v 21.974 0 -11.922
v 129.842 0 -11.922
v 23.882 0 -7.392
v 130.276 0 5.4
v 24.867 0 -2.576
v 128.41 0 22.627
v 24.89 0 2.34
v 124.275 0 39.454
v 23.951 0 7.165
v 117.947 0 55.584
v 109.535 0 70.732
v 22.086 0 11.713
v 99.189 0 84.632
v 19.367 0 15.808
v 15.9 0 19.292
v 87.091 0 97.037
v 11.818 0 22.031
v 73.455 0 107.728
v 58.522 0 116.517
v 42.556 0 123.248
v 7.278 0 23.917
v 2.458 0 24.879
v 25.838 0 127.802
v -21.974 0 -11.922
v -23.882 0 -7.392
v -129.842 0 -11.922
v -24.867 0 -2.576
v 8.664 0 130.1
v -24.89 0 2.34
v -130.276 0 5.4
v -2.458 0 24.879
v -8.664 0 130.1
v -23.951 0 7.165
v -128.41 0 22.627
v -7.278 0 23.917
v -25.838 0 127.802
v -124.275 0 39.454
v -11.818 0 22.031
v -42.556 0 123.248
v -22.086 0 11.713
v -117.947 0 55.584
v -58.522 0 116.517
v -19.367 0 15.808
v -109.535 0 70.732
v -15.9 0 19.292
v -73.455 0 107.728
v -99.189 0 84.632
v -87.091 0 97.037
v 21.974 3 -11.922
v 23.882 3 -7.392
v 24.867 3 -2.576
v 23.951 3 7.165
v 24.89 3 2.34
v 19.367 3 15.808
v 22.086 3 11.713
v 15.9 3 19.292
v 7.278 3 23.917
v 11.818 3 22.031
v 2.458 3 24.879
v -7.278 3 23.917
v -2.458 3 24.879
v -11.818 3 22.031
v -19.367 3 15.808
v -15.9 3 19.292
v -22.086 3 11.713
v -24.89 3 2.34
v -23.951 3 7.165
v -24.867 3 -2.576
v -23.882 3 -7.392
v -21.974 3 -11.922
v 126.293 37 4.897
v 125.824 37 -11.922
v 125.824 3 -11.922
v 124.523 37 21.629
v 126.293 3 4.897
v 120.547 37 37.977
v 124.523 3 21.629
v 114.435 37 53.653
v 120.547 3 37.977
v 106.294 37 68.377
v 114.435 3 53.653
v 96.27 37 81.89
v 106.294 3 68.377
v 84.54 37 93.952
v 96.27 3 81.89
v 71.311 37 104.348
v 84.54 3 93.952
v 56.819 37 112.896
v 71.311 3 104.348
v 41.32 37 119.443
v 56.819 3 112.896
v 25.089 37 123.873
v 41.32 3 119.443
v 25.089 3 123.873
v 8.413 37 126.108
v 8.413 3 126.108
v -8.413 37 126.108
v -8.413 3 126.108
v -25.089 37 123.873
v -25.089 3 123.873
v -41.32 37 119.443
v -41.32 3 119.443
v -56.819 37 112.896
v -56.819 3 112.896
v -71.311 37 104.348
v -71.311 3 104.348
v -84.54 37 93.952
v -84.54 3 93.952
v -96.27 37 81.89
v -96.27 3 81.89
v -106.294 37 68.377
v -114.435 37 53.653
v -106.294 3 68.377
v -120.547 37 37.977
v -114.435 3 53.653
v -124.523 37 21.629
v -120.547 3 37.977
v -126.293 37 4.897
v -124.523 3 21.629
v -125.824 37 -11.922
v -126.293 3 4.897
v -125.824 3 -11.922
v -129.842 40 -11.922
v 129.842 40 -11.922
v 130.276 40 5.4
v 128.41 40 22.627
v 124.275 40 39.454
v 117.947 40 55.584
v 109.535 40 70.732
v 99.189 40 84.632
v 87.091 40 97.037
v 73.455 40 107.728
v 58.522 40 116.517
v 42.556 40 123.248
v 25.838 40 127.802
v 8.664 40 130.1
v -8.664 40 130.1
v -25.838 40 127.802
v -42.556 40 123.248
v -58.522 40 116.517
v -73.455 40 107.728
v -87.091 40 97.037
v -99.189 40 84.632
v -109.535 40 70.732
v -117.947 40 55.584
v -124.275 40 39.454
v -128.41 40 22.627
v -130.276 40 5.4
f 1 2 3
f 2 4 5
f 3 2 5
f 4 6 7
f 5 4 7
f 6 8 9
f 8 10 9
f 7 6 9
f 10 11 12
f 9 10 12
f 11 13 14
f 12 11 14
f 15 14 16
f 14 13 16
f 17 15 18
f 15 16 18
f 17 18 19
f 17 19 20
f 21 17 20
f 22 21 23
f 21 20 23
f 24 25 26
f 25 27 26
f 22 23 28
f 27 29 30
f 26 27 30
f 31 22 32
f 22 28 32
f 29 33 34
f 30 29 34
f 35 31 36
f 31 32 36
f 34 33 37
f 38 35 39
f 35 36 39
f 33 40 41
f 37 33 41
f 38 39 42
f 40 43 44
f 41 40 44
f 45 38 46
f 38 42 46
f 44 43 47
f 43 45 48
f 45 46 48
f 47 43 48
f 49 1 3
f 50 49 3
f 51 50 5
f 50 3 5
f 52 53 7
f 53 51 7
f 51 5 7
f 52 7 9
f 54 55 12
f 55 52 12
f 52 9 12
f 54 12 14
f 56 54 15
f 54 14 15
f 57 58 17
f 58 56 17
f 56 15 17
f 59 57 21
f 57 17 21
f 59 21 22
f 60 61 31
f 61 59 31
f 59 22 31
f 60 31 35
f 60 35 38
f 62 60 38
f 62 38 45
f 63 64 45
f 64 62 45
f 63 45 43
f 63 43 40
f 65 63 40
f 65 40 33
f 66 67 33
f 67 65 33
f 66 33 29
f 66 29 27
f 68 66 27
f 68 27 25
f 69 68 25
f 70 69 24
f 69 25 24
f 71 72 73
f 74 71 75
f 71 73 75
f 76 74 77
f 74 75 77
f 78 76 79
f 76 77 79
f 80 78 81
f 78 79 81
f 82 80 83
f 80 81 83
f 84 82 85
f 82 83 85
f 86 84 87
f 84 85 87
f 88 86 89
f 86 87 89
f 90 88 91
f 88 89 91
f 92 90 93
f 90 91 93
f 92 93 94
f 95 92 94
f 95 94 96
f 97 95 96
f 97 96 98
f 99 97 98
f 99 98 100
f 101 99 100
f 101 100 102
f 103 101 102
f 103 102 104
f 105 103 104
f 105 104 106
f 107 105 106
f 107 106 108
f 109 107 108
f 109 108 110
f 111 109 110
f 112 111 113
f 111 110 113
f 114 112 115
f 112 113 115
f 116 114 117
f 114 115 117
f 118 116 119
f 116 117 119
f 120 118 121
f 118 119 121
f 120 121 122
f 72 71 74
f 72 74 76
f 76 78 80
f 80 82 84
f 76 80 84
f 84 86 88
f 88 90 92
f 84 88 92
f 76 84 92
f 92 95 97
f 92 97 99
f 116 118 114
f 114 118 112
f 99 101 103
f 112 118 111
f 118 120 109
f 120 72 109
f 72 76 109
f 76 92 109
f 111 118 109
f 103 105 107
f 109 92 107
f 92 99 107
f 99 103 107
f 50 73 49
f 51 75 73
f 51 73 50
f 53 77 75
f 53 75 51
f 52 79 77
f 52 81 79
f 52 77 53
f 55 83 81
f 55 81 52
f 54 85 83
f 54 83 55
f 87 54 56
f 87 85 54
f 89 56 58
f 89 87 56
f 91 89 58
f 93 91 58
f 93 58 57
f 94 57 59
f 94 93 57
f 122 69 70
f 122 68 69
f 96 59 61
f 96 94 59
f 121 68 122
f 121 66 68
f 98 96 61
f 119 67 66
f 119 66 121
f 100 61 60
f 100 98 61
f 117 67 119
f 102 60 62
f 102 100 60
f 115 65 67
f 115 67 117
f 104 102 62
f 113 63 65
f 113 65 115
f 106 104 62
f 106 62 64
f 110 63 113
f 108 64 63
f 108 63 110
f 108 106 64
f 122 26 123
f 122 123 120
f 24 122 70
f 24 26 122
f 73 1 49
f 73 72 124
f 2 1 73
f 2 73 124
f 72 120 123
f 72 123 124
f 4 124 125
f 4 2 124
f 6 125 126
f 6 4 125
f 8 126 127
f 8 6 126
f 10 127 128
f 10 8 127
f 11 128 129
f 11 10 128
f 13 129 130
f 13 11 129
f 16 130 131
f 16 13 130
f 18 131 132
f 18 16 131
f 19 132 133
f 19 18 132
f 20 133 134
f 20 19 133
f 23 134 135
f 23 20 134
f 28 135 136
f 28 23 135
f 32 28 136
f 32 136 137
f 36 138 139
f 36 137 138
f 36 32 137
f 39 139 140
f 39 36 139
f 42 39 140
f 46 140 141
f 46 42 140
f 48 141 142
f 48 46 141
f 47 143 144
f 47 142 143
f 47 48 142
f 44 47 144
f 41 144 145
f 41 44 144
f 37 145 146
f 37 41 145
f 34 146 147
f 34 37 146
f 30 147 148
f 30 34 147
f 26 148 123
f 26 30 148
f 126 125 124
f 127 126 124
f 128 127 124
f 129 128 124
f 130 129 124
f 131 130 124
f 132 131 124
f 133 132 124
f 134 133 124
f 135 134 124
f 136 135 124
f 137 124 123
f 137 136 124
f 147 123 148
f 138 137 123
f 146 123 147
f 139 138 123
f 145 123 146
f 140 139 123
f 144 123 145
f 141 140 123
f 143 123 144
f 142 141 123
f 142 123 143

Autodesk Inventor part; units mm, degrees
ref_plane "YZ Plane" through (0, 0, 0) normal (1, 0, 0) x (0, 1, 0)
ref_plane "XZ Plane" through (0, 0, 0) normal (0, 1, 0) x (-1, 0, 0)
ref_plane "XY Plane" through (0, 0, 0) normal (0, 0, 1) x (1, 0, 0)
sketch "Sketch1" plane through (0, 0, 0) normal (0, 1, 0) x (-1, 0, 0)
  circle A0 centre (0, 0) radius 116.3878
  circle A1 centre (0, 0) radius 126.3878
  line L0 (129.8416, -11.9217) -> (-129.8416, -11.9217)
  line L1 (125.8243, -171.9217) -> (-125.8243, -171.9217)
  circle A2 centre (0, 0) radius 130.3878
  circle A3 centre (0, 0) radius 25
  point P0 (-115.7756, -11.9217)
  point P1 (115.7756, -11.9217)
  point P2 (-125.8243, -11.9217)
  point P3 (125.8243, -11.9217)
  point P4 (-21.9744, -11.9217)
  point P5 (21.9744, -11.9217)
  dimension "d1" = 232.7756
  dimension "d2" = 10
  dimension "d6" = 160
  dimension "d7" = 171.9217
  dimension "d11" = 4
  dimension "d13" = 50
extrude "Extrusion1" add sketch "Sketch1" along normal blind 40 contours A0 L0 A3 | A0 L0 A1 | A3 L0 | L0 A2 A1 picked at (-80.805, 28.5699) picked at (-122.0572, 13.8082) picked at (7.5455, -2.0688) picked at (1.8738, 127.5443)
ref_plane "Work Plane2" through (0, 37, 0) normal (0, 1, 0) x (1, 0, 0)
ref_plane "Work Plane3" through (0, 3, 0) normal (0, -1, 0) x (1, 0, 0)
extrude "Extrusion2" cut sketch "Sketch1" along normal up to surface (34 mm away) from surface at 3 contours A0 L0 A3 | A0 L0 A1 | A3 L0 picked at (-80.805, 28.5699) picked at (-122.0572, 13.8082) picked at (7.5455, -2.0688)
extrude "Extrusion3" cut sketch "Sketch1" along normal up to surface (3 mm away) contours A3 L0 picked at (7.5455, -2.0688)
equation "\"d1\" = ballInletWheel_diameter"
equation "\"d2\" = ballInletWheel_margin"
equation "\"d6\" = profile_height"
equation "\"d7\" = ballInletWheel_offsetTop"
equation "\"d3\" = profile_width"
equation "\"d14\" = profile_width"
equation "\"d8\" = -profileTallWall_thickness"
equation "\"d12\" = -profileTallWall_thickness"
equation "\"ballInletWheel_diameter\" = 232.775591"
equation "\"ballInletWheel_margin\" = 10"
equation "\"profile_height\" = 160"
equation "\"profile_width\" = 40"
equation "\"profileTallWall_thickness\" = 3"
equation "\"ballInletWheel_offsetTop\" = 171.921659"
properties part number "ballInletCover"
